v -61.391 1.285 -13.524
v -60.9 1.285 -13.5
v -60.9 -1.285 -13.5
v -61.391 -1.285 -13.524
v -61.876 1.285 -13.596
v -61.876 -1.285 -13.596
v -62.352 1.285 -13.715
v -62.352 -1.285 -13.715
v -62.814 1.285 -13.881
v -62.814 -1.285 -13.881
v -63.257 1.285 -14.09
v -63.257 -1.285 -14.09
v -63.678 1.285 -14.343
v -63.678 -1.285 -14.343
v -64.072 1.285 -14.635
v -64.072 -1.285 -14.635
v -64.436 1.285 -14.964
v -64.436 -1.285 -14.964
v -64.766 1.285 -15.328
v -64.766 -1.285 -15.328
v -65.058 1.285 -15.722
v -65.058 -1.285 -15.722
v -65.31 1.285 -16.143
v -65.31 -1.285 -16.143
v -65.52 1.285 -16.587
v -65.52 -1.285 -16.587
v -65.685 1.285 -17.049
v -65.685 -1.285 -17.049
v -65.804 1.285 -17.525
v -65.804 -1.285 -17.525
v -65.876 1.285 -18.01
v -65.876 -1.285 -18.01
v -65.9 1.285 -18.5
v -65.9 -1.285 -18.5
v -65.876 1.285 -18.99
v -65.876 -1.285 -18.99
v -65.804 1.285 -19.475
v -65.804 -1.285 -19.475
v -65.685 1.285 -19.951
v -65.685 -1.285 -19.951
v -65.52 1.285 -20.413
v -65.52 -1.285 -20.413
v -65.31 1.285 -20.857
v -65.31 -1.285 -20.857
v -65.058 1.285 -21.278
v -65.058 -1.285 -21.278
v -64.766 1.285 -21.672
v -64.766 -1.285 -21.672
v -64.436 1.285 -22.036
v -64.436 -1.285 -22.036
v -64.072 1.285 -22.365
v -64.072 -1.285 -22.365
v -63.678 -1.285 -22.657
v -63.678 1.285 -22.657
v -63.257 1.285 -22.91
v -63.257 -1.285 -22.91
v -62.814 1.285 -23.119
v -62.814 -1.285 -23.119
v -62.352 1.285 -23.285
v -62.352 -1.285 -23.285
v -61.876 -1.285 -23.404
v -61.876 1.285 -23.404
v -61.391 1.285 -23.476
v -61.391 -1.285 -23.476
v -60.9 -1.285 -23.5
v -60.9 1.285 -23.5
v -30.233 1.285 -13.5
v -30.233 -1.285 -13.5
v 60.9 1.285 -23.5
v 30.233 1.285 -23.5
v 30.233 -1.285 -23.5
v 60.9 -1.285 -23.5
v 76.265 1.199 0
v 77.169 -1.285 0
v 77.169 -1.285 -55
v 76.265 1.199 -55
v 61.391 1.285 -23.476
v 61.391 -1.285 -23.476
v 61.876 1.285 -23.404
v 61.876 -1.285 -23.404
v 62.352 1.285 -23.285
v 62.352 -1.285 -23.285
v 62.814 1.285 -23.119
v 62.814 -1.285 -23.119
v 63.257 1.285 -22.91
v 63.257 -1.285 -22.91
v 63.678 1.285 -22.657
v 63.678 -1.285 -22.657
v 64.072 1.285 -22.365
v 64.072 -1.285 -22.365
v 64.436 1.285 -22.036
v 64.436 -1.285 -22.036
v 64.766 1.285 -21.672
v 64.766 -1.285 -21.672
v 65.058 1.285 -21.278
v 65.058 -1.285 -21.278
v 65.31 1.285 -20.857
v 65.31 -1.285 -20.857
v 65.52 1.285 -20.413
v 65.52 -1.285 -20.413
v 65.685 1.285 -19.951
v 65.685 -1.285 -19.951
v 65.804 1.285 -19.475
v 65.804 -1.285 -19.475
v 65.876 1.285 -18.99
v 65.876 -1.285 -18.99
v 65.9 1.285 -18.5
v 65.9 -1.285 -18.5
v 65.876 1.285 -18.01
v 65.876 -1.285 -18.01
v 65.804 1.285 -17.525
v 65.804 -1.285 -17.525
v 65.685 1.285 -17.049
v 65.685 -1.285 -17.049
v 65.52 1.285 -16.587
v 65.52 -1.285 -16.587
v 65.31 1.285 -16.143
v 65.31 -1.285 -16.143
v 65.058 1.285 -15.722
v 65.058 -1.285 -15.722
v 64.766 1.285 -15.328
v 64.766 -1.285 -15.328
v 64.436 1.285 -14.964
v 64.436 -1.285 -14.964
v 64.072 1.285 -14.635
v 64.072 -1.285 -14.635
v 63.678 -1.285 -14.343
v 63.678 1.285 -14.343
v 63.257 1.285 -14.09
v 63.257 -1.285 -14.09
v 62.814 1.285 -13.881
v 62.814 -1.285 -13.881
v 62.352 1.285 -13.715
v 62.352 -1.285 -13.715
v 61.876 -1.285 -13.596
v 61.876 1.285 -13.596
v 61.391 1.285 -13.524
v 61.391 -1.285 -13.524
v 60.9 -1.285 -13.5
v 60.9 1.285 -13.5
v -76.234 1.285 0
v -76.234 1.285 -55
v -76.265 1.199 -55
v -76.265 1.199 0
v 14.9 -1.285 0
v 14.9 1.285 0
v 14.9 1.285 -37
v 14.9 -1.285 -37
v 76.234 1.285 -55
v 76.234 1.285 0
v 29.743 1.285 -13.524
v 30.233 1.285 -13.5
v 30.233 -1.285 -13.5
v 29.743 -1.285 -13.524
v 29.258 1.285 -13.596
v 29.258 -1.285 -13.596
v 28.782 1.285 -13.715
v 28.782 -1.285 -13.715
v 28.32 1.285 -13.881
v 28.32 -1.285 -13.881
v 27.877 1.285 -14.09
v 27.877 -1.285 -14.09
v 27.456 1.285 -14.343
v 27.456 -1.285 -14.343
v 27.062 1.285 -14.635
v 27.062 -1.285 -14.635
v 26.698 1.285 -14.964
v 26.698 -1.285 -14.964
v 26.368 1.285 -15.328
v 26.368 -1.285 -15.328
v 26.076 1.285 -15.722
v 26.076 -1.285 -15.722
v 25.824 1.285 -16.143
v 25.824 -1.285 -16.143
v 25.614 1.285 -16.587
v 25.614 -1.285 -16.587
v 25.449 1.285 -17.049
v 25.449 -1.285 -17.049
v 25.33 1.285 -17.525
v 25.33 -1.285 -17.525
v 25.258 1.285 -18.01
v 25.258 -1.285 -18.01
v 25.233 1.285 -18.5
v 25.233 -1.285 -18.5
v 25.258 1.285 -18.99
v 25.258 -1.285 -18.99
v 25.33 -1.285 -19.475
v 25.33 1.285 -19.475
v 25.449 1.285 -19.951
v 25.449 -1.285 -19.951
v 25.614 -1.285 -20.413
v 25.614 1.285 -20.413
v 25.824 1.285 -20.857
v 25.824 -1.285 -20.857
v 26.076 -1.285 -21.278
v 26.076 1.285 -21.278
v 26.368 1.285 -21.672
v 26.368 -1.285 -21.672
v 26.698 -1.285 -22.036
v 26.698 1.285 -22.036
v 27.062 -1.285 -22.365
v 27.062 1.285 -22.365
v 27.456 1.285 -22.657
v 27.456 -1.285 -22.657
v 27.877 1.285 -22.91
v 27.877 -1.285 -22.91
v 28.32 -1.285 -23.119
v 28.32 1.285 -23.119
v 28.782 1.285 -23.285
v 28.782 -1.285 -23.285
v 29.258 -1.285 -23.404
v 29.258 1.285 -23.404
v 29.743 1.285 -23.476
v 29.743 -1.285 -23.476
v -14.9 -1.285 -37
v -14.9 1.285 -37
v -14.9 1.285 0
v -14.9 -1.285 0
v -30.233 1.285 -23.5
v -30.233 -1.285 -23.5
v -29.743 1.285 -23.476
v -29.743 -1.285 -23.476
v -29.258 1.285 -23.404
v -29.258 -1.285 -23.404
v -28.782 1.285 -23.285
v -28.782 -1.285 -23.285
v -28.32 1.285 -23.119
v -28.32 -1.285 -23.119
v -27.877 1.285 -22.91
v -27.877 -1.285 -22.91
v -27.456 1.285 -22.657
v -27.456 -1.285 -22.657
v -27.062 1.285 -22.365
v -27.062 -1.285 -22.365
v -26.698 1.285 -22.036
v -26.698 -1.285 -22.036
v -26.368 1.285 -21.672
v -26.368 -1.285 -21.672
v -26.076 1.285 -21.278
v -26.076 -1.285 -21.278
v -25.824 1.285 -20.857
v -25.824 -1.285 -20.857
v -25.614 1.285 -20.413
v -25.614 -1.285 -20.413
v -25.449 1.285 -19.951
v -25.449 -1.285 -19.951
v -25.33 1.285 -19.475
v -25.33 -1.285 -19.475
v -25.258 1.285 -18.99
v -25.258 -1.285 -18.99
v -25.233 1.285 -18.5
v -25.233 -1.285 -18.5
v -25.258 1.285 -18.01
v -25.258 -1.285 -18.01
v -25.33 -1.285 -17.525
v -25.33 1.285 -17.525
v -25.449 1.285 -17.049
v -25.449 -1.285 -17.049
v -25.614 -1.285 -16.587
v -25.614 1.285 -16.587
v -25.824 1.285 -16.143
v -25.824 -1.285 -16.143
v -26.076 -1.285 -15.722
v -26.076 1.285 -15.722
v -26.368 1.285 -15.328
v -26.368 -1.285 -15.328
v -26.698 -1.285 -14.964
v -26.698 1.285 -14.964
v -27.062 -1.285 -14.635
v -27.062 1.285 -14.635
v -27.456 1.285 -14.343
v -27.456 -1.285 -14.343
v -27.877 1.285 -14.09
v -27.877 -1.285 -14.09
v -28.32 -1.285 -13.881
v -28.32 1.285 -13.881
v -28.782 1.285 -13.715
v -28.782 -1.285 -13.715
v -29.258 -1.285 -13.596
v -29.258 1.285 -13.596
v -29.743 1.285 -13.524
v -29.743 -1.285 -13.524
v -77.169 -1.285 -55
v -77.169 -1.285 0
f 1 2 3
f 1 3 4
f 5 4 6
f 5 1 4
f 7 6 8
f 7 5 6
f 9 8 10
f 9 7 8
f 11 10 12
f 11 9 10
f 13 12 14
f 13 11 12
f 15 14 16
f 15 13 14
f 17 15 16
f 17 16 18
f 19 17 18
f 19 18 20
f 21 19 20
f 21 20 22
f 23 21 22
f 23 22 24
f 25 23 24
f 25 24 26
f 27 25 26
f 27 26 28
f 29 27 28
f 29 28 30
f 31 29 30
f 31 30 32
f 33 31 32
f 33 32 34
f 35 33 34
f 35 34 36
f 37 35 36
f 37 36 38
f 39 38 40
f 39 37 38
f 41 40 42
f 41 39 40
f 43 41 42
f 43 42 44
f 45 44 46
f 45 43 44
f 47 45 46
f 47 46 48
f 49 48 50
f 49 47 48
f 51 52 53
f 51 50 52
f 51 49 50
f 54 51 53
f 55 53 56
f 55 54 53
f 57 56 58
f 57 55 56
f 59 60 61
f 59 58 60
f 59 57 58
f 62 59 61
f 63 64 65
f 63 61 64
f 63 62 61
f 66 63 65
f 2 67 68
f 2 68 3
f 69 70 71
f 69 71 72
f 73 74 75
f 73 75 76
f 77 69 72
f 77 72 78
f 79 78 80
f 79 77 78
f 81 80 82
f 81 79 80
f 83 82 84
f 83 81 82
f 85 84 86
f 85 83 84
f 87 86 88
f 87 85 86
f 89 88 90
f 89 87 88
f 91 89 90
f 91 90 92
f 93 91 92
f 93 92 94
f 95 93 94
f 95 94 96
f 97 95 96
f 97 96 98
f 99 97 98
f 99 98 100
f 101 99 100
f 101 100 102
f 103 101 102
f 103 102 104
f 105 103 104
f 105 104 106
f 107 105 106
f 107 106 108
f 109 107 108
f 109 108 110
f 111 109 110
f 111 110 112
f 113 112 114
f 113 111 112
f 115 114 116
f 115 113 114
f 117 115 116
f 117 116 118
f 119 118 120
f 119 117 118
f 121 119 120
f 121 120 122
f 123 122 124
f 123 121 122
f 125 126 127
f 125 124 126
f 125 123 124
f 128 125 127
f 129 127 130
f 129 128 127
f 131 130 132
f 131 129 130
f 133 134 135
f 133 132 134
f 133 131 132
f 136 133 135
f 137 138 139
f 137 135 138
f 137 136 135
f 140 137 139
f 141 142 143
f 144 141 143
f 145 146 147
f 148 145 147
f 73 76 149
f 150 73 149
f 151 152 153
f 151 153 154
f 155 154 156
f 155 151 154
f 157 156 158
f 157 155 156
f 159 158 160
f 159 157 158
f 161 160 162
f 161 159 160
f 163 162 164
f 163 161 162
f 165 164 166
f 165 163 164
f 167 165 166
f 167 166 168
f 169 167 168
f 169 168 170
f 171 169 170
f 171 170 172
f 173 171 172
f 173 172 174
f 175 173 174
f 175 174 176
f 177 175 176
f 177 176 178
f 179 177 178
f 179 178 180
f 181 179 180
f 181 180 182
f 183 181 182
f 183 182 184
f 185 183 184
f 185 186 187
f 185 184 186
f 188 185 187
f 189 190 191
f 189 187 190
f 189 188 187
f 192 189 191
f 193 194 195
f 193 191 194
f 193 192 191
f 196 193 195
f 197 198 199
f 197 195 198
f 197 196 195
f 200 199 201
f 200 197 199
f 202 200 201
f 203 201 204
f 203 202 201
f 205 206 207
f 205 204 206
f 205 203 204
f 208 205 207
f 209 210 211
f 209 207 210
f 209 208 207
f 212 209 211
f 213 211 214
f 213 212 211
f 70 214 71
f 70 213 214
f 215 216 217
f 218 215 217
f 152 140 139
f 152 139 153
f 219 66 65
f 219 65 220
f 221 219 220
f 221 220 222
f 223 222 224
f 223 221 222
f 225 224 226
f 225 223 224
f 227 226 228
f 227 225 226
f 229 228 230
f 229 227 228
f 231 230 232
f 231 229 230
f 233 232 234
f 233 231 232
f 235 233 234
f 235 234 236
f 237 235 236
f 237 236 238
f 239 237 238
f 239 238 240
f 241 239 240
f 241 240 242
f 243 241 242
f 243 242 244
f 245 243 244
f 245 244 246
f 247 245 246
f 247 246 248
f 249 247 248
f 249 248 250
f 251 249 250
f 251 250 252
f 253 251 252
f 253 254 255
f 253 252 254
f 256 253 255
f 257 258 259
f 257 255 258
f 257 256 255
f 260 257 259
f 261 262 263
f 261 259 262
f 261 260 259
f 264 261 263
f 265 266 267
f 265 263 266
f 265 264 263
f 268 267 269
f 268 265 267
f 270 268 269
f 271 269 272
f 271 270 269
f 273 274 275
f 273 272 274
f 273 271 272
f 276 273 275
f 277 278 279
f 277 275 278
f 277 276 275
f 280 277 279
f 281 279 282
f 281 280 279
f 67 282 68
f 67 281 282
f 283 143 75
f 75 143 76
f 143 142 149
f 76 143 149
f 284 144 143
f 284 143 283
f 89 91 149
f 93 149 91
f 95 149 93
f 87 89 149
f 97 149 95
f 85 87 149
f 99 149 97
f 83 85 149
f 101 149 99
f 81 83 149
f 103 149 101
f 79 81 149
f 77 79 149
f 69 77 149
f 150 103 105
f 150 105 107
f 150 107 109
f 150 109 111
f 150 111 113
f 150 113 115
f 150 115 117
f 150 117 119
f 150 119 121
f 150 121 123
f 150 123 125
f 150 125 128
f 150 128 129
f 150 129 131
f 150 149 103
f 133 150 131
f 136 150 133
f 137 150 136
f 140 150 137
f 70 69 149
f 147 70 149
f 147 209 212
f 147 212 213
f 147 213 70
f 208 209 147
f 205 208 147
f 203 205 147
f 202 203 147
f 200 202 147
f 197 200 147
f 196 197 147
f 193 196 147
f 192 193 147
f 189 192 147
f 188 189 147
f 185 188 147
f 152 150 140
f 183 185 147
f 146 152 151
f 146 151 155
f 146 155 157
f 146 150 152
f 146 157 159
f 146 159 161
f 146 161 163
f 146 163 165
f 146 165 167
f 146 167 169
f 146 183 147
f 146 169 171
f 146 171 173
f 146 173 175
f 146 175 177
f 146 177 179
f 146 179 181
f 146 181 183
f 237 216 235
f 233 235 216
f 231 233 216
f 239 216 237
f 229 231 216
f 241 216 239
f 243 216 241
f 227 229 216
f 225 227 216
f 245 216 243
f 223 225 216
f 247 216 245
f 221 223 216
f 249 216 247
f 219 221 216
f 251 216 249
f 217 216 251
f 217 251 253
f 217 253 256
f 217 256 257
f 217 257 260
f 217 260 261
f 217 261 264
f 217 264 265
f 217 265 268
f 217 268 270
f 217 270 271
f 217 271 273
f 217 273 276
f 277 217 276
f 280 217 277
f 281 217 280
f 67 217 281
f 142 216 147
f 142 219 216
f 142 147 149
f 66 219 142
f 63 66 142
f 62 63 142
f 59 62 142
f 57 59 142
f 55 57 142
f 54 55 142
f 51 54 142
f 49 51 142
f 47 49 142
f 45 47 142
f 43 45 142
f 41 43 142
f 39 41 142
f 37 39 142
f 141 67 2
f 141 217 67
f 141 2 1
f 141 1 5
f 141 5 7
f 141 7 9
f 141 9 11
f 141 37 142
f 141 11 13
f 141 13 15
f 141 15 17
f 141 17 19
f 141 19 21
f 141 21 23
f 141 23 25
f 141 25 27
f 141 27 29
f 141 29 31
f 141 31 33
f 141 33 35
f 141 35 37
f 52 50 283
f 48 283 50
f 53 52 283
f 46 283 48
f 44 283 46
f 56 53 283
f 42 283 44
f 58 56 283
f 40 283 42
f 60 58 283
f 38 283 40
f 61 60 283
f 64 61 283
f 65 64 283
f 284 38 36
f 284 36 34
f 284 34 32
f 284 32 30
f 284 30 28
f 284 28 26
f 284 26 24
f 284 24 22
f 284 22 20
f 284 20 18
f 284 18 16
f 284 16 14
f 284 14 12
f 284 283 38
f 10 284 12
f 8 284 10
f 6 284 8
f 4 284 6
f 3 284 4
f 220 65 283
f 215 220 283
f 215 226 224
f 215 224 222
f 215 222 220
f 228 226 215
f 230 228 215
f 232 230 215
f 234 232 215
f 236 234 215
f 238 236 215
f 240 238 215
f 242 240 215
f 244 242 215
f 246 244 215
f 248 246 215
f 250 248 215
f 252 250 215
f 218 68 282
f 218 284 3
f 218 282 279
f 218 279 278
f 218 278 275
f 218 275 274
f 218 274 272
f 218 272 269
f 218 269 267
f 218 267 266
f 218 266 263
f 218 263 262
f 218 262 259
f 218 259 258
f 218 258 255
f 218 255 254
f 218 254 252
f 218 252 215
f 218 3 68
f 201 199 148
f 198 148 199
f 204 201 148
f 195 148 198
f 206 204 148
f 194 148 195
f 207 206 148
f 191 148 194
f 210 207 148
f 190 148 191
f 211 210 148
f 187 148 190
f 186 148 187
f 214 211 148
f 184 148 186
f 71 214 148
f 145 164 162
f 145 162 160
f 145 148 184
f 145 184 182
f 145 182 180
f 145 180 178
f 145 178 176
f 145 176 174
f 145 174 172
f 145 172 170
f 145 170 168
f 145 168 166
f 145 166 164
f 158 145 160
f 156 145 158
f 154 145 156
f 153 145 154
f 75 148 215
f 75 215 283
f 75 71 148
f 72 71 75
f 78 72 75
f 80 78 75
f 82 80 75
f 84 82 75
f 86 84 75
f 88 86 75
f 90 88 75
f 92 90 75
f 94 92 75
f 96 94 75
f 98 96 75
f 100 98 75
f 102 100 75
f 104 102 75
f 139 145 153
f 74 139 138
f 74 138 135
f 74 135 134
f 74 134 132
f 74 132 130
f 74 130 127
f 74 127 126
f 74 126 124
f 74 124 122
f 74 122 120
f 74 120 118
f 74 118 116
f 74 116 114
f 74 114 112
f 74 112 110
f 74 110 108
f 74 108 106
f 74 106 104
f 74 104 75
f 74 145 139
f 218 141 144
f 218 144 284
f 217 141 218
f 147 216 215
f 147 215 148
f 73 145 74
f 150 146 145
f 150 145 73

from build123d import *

# Parameters (mm, degrees)
BOSS_EXTRUDE1_DEPTH = 55
CUT_EXTRUDE4_DEPTH  = 3
CUT_EXTRUDE5_DEPTH  = 3


with BuildPart() as part:
    # Sketch3 → Boss-Extrude1 (new body)
    with BuildSketch(Plane.XY):
        Polygon((-76.265076845, 1.199033895), (-77.169023428, -1.284538931), (77.169023428, -1.284538931), (76.265076845, 1.199033895), (76.233955557, 1.284538931), (76.075119575, 1.284538931), (-76.233955557, 1.284538931), align=None)
    extrude(amount=-BOSS_EXTRUDE1_DEPTH)

    # Sketch4 → Cut-Extrude4 (cut)
    with BuildSketch(Plane(origin=(0, 1.284538931, 0), x_dir=(1, 0, 0), z_dir=(0, 1, 0))):
        Polygon((-14.9, 0), (-14.9, 37), (14.9, 37), (14.9, 0.115445968), (14.9, -2.514676192), (-14.9, -2.514676192), align=None)
    extrude(amount=-CUT_EXTRUDE4_DEPTH, mode=Mode.SUBTRACT)

    # Sketch5 → Cut-Extrude5 (cut)
    with BuildSketch(Plane(origin=(0, 1.284538931, 0), x_dir=(1, 0, 0), z_dir=(0, 1, 0))):
        with BuildLine():
            Line((-60.900466668, 23.5), (-30.233488889, 23.5))
            ThreePointArc((-30.233488889, 23.5), (-25.233488889, 18.5), (-30.233488889, 13.5))
            Line((-30.233488889, 13.5), (-60.900466668, 13.5))
            ThreePointArc((-60.900466668, 13.5), (-65.900466668, 18.5), (-60.900466668, 23.5))
        make_face()
        with BuildLine():
            Line((60.900466668, 13.5), (30.233488889, 13.5))
            ThreePointArc((30.233488889, 13.5), (25.233488889, 18.5), (30.233488889, 23.5))
            Line((30.233488889, 23.5), (60.900466668, 23.5))
            ThreePointArc((60.900466668, 23.5), (65.900466668, 18.5), (60.900466668, 13.5))
        make_face()
    extrude(amount=-CUT_EXTRUDE5_DEPTH, mode=Mode.SUBTRACT)


solid = part.part
